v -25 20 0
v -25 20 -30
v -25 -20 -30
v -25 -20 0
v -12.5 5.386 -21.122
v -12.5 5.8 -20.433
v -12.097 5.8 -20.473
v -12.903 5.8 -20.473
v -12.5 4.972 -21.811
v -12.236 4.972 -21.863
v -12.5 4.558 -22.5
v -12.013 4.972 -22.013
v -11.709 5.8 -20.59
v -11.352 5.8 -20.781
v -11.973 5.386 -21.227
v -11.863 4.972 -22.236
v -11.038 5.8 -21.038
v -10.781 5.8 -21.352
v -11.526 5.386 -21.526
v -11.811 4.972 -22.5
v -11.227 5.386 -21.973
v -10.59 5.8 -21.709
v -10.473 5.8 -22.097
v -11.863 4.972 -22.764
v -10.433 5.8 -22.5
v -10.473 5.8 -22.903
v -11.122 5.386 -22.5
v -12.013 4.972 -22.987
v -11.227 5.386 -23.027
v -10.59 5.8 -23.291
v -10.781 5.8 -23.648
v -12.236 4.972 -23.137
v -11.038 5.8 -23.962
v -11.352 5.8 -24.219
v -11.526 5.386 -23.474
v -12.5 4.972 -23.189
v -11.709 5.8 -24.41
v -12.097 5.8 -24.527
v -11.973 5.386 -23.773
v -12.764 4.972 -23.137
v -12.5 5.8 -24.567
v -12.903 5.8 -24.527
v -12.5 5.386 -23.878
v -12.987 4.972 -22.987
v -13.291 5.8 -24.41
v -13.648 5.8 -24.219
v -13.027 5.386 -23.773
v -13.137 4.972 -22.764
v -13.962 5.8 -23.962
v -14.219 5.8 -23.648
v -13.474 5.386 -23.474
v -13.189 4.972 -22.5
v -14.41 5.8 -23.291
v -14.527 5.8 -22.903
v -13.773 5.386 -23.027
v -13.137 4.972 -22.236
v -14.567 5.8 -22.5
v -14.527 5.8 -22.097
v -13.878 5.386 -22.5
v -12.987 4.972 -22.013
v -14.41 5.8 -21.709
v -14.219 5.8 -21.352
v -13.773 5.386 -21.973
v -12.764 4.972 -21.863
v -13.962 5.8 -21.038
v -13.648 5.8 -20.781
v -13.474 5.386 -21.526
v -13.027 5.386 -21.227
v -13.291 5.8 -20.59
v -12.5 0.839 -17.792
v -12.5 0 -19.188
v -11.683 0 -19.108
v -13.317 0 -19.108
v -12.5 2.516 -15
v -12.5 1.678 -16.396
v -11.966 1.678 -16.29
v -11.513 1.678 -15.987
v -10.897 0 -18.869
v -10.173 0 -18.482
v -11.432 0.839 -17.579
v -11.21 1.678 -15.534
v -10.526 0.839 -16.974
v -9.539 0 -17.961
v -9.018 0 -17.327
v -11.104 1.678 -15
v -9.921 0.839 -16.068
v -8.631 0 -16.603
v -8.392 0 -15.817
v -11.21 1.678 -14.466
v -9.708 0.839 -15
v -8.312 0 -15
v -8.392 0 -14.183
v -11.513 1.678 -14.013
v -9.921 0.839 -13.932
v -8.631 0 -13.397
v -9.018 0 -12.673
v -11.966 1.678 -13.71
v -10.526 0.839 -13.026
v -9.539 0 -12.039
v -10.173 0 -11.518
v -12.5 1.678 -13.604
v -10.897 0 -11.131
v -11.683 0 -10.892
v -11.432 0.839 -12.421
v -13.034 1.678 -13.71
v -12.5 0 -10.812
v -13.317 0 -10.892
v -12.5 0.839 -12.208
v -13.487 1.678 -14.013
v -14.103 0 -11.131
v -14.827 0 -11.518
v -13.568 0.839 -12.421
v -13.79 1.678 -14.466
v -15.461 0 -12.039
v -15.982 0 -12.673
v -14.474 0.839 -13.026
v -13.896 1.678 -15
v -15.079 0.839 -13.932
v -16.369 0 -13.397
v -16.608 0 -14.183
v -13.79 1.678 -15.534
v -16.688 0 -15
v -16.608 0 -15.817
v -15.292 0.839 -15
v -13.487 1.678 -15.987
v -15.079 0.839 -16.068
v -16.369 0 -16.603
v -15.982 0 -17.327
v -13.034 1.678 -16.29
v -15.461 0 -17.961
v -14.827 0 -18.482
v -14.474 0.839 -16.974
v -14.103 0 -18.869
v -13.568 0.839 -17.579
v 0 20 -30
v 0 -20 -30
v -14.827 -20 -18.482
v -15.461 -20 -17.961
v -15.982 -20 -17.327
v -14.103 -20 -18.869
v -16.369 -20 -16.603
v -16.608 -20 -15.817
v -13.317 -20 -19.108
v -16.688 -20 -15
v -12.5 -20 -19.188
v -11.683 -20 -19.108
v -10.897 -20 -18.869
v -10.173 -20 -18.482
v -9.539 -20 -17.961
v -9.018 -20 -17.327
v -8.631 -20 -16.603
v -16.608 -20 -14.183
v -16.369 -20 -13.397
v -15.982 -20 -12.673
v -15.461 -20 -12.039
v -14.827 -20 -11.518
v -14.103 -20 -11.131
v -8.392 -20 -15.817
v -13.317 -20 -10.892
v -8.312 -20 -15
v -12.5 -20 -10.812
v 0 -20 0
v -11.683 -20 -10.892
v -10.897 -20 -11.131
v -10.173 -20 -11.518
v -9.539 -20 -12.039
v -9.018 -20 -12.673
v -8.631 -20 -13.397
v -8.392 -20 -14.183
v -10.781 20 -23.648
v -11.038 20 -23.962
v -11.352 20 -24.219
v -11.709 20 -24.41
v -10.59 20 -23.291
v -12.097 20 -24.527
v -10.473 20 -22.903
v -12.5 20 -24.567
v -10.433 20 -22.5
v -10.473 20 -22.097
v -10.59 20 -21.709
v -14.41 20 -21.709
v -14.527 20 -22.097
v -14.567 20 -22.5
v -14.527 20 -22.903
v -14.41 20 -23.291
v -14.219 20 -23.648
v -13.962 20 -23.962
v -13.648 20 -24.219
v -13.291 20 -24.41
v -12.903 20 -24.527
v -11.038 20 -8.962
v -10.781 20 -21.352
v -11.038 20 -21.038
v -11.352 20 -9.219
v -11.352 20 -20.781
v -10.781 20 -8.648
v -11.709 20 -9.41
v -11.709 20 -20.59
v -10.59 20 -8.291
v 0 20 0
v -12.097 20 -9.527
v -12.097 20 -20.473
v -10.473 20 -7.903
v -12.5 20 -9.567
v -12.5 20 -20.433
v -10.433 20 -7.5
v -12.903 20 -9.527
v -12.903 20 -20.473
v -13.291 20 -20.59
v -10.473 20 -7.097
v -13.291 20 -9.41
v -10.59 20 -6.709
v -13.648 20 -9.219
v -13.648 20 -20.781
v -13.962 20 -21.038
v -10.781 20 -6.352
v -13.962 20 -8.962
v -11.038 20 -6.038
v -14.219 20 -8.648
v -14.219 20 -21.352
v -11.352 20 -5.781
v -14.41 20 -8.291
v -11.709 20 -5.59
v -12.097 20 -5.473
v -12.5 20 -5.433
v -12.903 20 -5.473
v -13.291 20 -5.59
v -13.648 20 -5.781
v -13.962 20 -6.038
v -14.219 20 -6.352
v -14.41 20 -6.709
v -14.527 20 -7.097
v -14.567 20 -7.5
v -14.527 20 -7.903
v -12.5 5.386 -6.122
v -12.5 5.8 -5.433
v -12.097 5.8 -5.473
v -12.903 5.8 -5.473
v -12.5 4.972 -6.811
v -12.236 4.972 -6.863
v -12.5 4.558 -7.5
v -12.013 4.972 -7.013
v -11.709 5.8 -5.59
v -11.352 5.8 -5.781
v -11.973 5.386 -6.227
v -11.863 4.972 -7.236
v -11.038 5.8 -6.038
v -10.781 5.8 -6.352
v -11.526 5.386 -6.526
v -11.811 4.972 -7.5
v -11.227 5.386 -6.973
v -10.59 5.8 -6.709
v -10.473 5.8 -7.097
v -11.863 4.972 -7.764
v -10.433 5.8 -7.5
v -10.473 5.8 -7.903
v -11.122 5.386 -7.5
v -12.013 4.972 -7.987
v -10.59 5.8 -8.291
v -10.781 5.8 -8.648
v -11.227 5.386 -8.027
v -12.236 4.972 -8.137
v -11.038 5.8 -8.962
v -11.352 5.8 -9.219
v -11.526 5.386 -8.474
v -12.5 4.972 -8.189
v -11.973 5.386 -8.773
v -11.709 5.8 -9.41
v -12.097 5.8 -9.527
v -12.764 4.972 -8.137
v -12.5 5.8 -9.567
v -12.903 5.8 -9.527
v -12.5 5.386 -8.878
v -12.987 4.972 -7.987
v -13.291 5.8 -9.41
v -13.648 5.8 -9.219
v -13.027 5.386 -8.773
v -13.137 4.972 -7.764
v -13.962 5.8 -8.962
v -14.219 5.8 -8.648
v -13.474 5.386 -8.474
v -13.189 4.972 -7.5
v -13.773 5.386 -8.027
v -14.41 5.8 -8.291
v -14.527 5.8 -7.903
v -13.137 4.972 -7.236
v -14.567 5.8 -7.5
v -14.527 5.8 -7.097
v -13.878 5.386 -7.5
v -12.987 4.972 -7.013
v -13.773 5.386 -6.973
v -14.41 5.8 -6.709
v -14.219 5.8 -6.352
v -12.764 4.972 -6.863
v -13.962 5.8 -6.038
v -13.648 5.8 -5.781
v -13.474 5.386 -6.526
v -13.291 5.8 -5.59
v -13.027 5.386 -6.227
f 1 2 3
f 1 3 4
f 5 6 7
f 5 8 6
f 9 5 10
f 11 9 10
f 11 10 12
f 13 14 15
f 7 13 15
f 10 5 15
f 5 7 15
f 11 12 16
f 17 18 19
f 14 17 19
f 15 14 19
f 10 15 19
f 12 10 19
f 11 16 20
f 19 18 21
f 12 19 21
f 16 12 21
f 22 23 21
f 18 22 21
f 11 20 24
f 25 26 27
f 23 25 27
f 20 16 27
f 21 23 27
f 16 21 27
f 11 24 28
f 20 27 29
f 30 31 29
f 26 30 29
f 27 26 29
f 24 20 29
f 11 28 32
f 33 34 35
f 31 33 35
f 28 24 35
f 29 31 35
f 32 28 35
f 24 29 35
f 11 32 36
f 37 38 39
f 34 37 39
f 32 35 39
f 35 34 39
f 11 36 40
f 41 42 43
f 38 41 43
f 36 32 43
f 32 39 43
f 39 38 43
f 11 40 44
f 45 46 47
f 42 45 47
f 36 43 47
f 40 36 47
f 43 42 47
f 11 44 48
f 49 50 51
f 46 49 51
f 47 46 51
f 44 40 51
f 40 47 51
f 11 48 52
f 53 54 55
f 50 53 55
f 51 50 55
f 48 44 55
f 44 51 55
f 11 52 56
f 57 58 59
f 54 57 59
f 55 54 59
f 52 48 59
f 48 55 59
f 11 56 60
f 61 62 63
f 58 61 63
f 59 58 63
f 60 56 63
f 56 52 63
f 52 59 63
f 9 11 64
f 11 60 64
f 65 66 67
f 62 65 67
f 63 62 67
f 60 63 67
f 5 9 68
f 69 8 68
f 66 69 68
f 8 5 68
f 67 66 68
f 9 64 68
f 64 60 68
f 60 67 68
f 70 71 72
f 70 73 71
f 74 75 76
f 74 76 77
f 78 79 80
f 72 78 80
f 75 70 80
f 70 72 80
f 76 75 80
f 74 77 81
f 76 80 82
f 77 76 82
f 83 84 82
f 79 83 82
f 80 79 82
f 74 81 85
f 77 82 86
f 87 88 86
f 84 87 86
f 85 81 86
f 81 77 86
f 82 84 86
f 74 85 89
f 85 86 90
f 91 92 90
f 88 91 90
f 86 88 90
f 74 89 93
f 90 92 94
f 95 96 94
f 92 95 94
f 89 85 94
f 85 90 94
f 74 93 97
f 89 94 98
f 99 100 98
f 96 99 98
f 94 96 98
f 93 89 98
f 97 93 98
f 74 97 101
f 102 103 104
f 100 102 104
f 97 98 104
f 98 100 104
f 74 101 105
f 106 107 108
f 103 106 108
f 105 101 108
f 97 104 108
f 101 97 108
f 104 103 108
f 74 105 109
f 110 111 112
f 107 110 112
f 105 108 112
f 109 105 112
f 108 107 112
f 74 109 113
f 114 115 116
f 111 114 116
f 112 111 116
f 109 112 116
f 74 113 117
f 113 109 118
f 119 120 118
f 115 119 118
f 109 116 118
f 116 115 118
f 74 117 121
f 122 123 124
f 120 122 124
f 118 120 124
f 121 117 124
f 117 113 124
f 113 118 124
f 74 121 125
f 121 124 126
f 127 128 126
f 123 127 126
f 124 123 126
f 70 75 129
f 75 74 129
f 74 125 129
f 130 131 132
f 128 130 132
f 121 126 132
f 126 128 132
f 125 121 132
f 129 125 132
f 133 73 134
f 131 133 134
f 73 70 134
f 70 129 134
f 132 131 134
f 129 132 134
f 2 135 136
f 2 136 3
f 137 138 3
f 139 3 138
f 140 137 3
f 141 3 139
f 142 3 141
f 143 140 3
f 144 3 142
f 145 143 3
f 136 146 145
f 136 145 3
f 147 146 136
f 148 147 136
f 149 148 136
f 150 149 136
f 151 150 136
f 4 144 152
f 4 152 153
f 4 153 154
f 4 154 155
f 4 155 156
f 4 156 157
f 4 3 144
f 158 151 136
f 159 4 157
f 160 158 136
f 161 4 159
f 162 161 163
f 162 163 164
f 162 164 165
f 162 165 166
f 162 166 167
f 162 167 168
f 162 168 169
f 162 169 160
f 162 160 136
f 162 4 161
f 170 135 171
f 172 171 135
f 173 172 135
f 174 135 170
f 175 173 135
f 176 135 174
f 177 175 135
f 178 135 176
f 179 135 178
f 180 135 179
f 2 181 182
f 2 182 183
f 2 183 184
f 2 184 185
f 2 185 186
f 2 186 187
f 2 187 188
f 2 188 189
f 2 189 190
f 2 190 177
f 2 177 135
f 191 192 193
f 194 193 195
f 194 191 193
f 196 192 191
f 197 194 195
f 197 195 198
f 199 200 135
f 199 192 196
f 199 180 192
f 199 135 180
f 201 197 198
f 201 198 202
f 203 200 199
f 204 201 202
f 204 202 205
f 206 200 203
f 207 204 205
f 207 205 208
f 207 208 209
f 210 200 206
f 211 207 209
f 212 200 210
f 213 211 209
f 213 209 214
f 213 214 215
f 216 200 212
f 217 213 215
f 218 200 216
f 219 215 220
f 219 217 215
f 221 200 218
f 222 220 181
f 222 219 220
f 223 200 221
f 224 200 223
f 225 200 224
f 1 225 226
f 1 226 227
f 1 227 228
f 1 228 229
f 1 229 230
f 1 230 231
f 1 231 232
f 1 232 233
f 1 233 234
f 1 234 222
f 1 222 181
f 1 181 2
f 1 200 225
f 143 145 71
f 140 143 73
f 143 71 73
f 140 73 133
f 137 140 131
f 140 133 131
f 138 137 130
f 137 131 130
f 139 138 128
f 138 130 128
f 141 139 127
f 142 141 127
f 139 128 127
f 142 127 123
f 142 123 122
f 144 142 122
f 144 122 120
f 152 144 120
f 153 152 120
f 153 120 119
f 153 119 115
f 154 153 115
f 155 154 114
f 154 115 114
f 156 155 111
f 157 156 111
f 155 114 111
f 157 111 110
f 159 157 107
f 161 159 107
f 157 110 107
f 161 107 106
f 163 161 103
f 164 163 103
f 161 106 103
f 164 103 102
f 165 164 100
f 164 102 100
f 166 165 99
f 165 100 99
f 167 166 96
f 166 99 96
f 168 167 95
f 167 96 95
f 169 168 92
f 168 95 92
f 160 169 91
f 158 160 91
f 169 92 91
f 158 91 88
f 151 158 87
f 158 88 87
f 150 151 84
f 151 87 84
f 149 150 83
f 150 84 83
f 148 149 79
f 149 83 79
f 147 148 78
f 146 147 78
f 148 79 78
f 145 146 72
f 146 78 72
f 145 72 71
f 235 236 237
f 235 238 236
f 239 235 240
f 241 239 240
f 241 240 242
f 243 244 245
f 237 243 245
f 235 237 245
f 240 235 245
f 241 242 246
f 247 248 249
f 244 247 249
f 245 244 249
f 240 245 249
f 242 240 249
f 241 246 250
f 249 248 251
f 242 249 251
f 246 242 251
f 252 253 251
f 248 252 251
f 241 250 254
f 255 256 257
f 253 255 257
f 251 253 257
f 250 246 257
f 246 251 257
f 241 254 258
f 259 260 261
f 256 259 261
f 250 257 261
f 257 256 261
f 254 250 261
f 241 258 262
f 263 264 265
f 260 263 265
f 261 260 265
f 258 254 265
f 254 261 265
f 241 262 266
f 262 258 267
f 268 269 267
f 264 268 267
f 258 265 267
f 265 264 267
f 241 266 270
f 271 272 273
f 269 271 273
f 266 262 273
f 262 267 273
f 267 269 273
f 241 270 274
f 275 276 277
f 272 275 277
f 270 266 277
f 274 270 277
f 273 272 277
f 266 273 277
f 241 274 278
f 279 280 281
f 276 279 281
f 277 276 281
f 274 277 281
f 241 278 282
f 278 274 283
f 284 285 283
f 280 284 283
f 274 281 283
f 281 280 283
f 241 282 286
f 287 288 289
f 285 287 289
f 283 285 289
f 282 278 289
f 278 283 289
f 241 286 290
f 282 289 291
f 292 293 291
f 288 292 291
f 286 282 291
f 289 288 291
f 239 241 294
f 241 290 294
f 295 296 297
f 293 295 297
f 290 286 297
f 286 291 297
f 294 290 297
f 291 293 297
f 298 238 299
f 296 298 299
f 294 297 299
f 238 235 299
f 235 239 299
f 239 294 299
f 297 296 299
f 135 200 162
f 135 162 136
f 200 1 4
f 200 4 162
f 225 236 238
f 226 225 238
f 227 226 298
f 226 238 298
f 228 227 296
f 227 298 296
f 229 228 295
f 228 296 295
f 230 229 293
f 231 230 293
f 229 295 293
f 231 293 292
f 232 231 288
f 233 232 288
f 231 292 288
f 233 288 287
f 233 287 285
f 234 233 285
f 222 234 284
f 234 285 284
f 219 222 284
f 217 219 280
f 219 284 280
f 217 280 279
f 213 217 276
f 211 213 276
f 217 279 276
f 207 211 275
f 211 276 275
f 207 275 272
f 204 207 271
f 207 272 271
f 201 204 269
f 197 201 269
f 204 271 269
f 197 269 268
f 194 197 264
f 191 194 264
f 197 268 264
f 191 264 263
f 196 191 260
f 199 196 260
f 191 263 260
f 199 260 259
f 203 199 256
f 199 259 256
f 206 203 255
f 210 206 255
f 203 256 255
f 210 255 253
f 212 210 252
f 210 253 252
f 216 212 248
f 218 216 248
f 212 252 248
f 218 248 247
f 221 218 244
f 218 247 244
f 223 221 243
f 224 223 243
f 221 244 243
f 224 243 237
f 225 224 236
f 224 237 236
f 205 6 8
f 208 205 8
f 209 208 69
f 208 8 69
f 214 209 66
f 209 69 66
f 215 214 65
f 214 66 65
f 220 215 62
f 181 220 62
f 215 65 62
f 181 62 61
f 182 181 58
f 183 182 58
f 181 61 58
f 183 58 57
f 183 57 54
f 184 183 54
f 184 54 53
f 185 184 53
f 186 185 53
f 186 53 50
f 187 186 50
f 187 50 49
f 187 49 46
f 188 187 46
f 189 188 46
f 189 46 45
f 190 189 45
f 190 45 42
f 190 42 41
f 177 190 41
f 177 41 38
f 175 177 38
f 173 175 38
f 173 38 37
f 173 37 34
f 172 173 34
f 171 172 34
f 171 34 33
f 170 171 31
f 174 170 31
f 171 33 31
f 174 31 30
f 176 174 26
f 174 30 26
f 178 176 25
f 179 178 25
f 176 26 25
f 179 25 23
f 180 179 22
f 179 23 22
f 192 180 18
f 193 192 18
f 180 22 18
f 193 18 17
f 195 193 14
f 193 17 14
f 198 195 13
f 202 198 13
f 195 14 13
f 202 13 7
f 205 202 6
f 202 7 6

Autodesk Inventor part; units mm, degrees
ref_plane "YZ Plane" through (0, 0, 0) normal (1, 0, 0) x (0, 1, 0)
ref_plane "XZ Plane" through (0, 0, 0) normal (0, 1, 0) x (-1, 0, 0)
ref_plane "XY Plane" through (0, 0, 0) normal (0, 0, 1) x (1, 0, 0)
sketch "Esboço1" plane through (0, 0, 0) normal (0, 1, 0) x (-1, 0, 0)
  line L0 (0, 0) -> (25, 0)
  line L1 (25, 0) -> (25, -30)
  line L2 (25, -30) -> (0, -30)
  line L3 (0, -30) -> (0, 0)
  dimension "d0" = 25
  dimension "d1" = 30
extrude "Extrusão1" add sketch "Esboço1" along normal blind 20
sketch "Esboço2" plane through (0, 20, 0) normal (0, 1, 0) x (1, 0, 0)
  line L0 (0, 30) -> (-25, 30) projected
  line L1 (-25, 30) -> (-25, 0) projected
  line L2 (-25, 0) -> (0, 0) projected
  point P0 (-12.5, 7.5)
  point P1 (-12.5, 22.5)
  point P2 (-12.5, 30)
  point P3 (-12.5, 0)
  dimension "d4" = 25
  dimension "d5" = 12.5
  dimension "d6" = 12.5
  dimension "d31" = 7.5
  dimension "d32" = 7.5
hole "Furo1" at (-12.5, 20, -7.5) at (-12.5, 20, -22.5) direction (0, -1, 0) diameter 4.134 depth 14.2 tip angle 118 thread size "M5x0.8" class "6H" standard "ISO Metric profile"
sketch "Esboço3" plane through (0, 0, 0) normal (0, -1, 0) x (1, 0, 0)
  circle A0 centre (-12.5, -15) radius 7.5 construction
  line L0 (0, 0) -> (0, -30) projected
  line L1 (0, -30) -> (-25, -30) projected
  line L2 (-25, -30) -> (-25, 0) projected
  line L3 (0, -30) -> (-25, -30) projected
  line L4 (0, 0) -> (0, -30) projected
  line L5 (-25, 0) -> (0, 0) projected
  dimension "d16" = 25
  dimension "d17" = 30
  dimension "d18" = 12.5
  dimension "d19" = 15
  dimension "d21" = 15
extrude "Extrusão2" add sketch "Esboço3" along normal blind 20
sketch "Esboço5" plane through (-12.5, -20, -15) normal (0, -1, 0) x (1, 0, 0)
  circle A0 centre (0, 0) radius 7.5 projected
  point P0 (12.5, 15)
hole "Furo3" at (-12.5, -20, -15) direction (0, 1, 0) diameter 8.376 depth 20 tip angle 118 thread size "M10x1.5" class "6H" standard "ISO Metric profile"
equation "\"d6\" = d5"
equation "\"d32\" = d31"
equation "\"d18\" = 0.5 * d16"
equation "\"d19\" = 0.5 * d17"
equation "\"Raio_vergadura\" = Espessura"
equation "\"Largura_alívio_de_vergadura\" = Espessura"
equation "\"Profundidade_alívio_de_vergadura\" = 0.5 * Espessura"
equation "\"Tamanho_alívio_de_dobra\" = 4 * Espessura"
equation "\"Remanescente_mínimo\" = 2 * Espessura"
equation "\"Raiodetransição\" = Raio_vergadura"
equation "\"Tamanho_de_raio_de_Jacobi\" = Raio_vergadura"
equation "\"TamanhoFolga\" = Espessura"
equation "\"Espessura\" = 0.5"
properties part number "Suporte da probe" material "Alumínio 6061"
